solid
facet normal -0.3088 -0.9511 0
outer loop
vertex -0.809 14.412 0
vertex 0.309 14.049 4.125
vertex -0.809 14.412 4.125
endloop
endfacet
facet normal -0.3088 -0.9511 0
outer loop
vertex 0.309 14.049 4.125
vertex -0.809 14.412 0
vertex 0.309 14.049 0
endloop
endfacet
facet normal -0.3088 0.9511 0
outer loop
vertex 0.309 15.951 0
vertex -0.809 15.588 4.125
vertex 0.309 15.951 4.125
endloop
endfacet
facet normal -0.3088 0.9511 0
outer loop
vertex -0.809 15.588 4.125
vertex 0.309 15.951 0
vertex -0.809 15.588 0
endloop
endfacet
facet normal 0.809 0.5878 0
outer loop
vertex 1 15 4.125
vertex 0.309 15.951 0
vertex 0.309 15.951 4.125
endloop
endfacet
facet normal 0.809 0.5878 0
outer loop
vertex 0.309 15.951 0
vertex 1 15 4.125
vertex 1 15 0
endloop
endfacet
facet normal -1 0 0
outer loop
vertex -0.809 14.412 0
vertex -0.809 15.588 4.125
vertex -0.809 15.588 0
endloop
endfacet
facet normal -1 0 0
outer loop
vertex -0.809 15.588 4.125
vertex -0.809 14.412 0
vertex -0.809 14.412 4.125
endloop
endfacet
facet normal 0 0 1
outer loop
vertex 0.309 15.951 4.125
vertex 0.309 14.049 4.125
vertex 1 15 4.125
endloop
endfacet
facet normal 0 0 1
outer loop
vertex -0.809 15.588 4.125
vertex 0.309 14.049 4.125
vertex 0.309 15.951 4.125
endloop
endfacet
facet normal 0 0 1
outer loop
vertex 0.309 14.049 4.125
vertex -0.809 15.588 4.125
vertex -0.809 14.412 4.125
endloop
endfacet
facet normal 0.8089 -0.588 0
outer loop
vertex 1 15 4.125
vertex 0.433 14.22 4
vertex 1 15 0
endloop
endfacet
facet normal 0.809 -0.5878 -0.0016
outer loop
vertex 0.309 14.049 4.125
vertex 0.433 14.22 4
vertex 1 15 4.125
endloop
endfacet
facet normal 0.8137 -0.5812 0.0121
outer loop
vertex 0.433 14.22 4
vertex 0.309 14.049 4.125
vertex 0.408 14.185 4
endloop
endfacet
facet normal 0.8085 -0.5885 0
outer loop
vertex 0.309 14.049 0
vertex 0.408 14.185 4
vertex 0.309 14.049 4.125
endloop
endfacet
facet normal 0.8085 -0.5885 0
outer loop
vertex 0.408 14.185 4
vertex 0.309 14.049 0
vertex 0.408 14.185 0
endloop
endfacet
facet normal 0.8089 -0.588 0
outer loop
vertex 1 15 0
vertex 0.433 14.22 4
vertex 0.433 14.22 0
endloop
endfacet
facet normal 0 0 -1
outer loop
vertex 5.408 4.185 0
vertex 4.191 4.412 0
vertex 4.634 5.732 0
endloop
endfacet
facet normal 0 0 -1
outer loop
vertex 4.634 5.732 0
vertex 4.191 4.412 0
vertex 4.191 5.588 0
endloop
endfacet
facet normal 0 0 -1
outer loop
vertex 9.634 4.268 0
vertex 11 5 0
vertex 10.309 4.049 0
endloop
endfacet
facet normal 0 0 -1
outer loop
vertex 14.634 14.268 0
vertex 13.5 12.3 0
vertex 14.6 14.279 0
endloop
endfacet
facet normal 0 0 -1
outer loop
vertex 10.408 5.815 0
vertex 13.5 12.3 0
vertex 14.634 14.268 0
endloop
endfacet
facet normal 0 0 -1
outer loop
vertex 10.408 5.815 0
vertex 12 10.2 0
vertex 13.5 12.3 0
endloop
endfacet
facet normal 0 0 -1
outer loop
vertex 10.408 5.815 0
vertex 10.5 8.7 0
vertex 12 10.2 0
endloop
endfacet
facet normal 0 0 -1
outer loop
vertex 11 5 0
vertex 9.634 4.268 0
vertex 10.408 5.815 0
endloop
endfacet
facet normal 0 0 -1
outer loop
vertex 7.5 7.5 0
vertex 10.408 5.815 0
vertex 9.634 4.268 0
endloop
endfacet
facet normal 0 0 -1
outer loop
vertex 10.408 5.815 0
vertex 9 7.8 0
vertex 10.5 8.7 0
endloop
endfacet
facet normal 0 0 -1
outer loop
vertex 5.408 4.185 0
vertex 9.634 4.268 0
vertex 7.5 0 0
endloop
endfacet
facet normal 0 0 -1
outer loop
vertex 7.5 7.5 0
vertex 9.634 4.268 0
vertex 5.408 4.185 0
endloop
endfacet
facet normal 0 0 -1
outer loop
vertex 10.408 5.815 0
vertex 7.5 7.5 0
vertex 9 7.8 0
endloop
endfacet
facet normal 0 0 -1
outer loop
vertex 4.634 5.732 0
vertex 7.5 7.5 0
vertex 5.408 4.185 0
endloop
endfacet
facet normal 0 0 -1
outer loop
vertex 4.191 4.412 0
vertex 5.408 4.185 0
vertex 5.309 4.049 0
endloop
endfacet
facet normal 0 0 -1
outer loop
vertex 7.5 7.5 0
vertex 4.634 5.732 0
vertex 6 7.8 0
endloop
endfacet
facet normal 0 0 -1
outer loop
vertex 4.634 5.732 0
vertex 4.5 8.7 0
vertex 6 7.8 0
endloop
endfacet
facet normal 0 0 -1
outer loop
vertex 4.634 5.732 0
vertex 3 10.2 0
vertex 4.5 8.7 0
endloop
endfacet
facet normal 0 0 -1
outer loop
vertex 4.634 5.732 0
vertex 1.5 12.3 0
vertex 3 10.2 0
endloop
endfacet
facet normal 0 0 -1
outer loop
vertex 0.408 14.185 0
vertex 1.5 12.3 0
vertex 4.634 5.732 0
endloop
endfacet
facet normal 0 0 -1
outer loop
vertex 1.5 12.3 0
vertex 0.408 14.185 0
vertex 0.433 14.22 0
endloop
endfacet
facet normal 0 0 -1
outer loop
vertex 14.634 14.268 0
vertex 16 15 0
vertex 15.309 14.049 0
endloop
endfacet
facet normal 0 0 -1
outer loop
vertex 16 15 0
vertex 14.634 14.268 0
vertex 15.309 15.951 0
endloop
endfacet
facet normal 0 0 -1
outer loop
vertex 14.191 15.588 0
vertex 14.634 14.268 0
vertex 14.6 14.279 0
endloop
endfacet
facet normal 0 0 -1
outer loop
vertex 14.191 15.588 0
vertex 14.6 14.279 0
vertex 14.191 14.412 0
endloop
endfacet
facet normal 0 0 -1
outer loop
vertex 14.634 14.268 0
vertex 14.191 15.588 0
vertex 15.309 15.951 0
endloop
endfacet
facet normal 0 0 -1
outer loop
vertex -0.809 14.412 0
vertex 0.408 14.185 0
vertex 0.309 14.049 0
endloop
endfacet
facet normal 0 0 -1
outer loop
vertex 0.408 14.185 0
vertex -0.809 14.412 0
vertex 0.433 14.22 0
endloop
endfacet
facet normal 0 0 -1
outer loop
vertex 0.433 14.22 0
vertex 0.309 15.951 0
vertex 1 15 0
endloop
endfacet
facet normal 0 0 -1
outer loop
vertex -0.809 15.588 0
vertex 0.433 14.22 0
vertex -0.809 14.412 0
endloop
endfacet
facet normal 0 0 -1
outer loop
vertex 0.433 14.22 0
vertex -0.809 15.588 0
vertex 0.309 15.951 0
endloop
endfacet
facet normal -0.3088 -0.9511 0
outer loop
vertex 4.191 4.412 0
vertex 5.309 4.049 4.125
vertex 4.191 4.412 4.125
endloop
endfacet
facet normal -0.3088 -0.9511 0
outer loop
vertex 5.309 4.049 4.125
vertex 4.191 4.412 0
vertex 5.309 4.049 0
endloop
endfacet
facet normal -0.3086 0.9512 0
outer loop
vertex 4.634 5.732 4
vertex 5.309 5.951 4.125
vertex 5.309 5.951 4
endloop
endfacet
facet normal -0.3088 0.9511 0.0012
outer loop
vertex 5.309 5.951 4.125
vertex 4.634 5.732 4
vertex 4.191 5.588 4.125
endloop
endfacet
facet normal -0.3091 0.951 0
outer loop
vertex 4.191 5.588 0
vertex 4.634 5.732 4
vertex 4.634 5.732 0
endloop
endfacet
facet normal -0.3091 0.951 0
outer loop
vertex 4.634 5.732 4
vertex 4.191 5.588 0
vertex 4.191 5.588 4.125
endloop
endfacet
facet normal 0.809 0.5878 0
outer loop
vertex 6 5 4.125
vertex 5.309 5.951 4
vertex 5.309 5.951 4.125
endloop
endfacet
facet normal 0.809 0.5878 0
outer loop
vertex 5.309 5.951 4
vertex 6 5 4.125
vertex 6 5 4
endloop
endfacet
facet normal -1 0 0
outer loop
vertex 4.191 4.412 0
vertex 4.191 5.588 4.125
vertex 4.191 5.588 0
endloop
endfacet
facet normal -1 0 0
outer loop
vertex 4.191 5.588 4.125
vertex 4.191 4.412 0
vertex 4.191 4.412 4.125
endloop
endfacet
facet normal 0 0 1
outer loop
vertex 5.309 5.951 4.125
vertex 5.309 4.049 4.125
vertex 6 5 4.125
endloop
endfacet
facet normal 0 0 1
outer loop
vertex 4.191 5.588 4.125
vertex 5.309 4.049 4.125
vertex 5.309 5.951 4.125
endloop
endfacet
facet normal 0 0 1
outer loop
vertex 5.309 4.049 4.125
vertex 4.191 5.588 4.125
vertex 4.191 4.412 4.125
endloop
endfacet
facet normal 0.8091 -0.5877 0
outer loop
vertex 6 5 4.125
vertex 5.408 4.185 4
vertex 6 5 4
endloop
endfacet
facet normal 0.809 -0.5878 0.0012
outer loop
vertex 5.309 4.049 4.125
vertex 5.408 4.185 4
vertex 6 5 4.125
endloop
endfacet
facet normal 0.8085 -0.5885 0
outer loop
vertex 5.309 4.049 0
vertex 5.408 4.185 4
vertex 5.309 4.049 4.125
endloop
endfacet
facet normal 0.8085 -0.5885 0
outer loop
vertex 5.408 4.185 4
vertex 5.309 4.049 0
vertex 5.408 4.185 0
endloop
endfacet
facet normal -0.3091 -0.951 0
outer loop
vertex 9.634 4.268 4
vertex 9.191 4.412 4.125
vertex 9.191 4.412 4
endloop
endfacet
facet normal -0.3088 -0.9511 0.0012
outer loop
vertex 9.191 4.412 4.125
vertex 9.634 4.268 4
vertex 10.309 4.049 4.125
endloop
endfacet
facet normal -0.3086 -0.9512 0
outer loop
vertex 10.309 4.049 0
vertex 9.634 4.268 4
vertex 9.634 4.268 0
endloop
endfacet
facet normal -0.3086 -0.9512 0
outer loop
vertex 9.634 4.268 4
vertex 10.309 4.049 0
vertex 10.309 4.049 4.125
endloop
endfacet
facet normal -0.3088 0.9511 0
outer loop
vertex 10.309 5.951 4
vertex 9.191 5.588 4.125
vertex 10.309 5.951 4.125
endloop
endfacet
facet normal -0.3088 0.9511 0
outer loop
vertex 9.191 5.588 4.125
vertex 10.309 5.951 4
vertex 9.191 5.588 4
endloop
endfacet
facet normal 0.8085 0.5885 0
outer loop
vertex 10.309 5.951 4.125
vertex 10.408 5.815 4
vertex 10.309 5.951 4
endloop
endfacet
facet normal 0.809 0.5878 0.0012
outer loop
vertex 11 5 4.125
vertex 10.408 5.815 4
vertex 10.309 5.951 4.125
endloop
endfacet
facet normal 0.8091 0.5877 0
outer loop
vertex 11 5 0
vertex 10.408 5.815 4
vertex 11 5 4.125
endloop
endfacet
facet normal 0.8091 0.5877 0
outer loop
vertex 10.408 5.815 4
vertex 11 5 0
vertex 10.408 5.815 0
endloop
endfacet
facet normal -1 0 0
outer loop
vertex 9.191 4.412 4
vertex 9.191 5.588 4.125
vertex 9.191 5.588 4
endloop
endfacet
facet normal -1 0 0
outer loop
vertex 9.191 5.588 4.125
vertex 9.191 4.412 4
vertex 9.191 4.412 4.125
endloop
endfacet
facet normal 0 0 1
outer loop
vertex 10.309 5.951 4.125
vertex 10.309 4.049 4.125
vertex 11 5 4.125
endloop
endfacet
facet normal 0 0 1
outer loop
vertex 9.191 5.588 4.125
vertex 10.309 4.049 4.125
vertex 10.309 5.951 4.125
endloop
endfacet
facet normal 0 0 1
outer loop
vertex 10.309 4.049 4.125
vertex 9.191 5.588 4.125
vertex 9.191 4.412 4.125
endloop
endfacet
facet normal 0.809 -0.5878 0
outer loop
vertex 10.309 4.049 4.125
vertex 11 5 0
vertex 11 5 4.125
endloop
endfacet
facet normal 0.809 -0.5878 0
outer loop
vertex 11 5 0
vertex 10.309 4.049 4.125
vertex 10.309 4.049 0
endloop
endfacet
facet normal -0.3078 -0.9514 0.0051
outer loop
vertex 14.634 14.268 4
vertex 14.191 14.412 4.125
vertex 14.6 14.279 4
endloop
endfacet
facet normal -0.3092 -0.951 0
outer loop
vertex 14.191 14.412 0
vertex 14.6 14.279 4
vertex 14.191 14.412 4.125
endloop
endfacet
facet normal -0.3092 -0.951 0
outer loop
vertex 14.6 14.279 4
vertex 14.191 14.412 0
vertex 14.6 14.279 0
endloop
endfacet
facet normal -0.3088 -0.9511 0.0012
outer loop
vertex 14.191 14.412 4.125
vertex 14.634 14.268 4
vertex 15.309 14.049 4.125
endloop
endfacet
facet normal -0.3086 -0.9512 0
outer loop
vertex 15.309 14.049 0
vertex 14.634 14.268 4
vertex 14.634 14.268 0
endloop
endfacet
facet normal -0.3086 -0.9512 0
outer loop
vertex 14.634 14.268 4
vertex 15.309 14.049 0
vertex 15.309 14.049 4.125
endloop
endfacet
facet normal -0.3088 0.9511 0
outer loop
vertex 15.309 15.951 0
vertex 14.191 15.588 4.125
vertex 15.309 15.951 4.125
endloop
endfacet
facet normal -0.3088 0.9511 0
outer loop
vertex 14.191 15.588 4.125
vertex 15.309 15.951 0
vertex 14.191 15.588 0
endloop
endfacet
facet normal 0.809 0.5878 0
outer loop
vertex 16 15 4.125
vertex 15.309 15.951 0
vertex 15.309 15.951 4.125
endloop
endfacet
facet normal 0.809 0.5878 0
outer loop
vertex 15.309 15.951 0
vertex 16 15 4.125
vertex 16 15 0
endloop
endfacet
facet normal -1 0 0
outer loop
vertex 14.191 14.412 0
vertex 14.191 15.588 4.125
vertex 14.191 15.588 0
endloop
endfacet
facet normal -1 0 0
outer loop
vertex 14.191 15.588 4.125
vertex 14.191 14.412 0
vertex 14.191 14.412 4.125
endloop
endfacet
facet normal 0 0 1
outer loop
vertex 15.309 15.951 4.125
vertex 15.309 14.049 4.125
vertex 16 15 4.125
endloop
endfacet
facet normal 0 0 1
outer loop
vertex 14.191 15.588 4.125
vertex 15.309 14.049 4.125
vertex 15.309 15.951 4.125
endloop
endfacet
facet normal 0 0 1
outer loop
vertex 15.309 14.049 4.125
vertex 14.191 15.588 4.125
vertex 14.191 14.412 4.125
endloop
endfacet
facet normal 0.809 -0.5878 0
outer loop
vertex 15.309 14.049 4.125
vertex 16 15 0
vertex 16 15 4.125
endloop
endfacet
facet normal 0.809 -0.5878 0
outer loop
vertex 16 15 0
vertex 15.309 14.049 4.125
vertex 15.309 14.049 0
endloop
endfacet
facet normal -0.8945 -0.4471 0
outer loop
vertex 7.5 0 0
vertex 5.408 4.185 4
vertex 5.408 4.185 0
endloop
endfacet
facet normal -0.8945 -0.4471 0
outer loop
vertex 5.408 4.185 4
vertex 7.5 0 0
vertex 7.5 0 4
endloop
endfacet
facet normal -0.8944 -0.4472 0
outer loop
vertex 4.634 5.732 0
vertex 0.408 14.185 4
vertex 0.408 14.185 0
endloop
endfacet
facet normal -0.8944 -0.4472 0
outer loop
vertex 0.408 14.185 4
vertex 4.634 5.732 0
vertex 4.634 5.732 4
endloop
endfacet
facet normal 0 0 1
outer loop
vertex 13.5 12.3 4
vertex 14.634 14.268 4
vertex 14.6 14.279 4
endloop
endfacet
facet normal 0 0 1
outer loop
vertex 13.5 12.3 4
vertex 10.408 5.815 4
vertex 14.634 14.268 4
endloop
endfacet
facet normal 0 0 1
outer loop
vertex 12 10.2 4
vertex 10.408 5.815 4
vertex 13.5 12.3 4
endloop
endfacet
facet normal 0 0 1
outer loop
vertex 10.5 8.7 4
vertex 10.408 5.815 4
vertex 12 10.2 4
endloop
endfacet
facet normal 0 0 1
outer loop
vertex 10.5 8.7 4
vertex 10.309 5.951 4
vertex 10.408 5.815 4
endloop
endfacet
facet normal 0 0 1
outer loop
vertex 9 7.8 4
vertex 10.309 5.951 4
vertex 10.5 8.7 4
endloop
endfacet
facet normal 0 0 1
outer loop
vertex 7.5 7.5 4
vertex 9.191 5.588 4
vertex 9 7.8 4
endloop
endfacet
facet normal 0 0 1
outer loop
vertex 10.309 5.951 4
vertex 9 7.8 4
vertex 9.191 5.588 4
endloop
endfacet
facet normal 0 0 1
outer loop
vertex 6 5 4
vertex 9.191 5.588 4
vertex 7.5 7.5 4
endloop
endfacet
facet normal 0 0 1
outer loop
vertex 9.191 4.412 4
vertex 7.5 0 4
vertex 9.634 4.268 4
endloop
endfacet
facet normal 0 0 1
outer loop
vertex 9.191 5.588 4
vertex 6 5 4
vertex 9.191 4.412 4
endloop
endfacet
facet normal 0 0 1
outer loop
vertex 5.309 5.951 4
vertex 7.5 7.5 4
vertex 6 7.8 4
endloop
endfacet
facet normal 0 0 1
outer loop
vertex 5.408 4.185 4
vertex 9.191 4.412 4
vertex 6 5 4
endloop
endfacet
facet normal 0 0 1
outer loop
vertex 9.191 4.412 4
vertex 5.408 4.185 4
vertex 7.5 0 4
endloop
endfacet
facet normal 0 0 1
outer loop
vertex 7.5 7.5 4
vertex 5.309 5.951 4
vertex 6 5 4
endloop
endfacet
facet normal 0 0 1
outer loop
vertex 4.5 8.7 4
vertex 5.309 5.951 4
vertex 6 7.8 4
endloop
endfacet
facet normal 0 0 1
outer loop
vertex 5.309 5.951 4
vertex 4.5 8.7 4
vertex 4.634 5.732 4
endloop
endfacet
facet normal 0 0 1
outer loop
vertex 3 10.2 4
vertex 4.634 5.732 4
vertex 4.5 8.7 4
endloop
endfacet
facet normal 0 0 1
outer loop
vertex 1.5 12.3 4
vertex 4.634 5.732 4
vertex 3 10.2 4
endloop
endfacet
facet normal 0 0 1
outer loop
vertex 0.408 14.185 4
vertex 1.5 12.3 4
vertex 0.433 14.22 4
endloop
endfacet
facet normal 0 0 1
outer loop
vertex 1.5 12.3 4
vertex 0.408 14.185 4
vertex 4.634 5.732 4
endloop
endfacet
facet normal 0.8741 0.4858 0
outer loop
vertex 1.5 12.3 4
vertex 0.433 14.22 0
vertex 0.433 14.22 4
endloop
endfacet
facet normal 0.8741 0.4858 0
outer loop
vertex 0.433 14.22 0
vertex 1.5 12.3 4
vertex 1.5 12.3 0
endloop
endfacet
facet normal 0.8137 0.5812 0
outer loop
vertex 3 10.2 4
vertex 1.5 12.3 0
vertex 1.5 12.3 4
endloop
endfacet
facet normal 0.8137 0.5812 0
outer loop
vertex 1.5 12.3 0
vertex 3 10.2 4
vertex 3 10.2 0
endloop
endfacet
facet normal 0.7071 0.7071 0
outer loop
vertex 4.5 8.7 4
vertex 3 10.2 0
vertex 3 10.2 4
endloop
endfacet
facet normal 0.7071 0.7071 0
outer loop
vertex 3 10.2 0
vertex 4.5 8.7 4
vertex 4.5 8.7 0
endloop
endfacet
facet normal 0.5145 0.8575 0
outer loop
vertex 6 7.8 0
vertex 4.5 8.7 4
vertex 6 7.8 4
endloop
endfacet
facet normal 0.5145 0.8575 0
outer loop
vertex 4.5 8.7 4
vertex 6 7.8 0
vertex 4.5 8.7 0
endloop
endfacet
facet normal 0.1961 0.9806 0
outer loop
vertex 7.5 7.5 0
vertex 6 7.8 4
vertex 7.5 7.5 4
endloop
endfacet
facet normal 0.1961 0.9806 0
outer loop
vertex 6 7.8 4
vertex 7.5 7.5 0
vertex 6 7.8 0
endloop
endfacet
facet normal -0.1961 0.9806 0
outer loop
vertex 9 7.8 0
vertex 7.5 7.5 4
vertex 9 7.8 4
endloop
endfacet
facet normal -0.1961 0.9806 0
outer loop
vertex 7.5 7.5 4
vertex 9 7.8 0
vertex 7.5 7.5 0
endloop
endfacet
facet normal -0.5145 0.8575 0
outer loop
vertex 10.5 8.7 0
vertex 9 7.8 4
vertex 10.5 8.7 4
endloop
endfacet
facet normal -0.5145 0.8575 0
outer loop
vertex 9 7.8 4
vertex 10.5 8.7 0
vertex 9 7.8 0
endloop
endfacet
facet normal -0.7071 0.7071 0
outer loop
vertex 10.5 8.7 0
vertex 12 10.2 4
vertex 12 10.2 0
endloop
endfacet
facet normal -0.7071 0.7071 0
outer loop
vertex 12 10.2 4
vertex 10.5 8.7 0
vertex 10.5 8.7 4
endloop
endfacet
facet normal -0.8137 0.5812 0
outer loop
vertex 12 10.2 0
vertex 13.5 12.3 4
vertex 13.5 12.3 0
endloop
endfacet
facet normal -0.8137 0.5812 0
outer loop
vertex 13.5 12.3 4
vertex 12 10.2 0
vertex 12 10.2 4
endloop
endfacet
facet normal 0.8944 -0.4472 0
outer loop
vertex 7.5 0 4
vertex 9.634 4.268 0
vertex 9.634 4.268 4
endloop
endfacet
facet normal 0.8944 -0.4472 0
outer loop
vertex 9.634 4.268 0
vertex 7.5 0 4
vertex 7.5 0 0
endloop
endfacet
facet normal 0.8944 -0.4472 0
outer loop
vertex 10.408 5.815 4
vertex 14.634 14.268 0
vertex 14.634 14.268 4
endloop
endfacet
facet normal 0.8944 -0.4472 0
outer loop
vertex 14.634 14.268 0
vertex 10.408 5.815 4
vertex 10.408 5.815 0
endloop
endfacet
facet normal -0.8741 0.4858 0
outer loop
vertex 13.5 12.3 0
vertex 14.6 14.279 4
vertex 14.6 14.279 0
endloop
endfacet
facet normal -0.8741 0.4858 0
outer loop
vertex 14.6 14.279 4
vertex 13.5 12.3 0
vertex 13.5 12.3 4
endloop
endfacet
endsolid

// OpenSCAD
// https://www.thingiverse.com/thing:8443
//
joinfactor = 0.125;

gFocalPoint = [0,0];
gSteps = 10;
gHeight = 4;

BezQuadCurve( [[0, 15],[5,5],[10,5],[15,15]], [7.5,0], gSteps, gHeight);

//=======================================
// Functions
//=======================================
function BEZ03(u) = pow((1-u), 3);
function BEZ13(u) = 3*u*(pow((1-u),2));
function BEZ23(u) = 3*(pow(u,2))*(1-u);
function BEZ33(u) = pow(u,3);

function PointAlongBez4(p0, p1, p2, p3, u) = [
	BEZ03(u)*p0[0]+BEZ13(u)*p1[0]+BEZ23(u)*p2[0]+BEZ33(u)*p3[0],
	BEZ03(u)*p0[1]+BEZ13(u)*p1[1]+BEZ23(u)*p2[1]+BEZ33(u)*p3[1]];

//=======================================
// Modules
//=======================================
// c - ControlPoints
module BezQuadCurve(c, focalPoint, steps=gSteps, height=gHeight, showPoints=true)
{
	// Draw control points
	// Just comment this out when you're doing the real thing
	if (showPoints)
	{
		for(point=[0:3])
		{
			translate(c[point])
			color([1,0,0])
			cylinder(r=1, h=height+joinfactor);
		}
	}

	difference()
	for(step = [1:steps])
	{
		linear_extrude(height = height, convexity = 10) 
		polygon(
			points=[
				focalPoint,
				PointAlongBez4(c[0], c[1], c[2],c[3], step/steps),
				PointAlongBez4(c[0], c[1], c[2],c[3], (step-1)/steps)],
			paths=[[0,1,2,0]]
		);
	}
}

//==============================================
// Test functions
//==============================================
//PlotBEZ0(100);
//PlotBEZ1(100);
//PlotBEZ2(100);
//PlotBEZ3(100);
//PlotBez4Blending();


module PlotBEZ0(steps)
{
	cubeSize = 1;
	cubeHeight = steps;

	for (step=[0:steps])
	{
		translate([cubeSize*step, 0, 0])
		cube(size=[cubeSize, cubeSize, BEZ03(step/steps)*cubeHeight]);
	}	
}

module PlotBEZ1(steps)
{
	cubeSize = 1;
	cubeHeight = steps;

	for (step=[0:steps])
	{
		translate([cubeSize*step, 0, 0])
		cube(size=[cubeSize, cubeSize, BEZ13(step/steps)*cubeHeight]);
	}	
}

module PlotBEZ2(steps)
{
	cubeSize = 1;
	cubeHeight = steps;

	for (step=[0:steps])
	{
		translate([cubeSize*step, 0, 0])
		cube(size=[cubeSize, cubeSize, BEZ23(step/steps)*cubeHeight]);
	}	
}

module PlotBEZ3(steps)
{
	cubeSize = 1;
	cubeHeight = steps;

	for (step=[0:steps])
	{
		translate([cubeSize*step, 0, 0])
		cube(size=[cubeSize, cubeSize, BEZ33(step/steps)*cubeHeight]);
	}	
}

module PlotBez4Blending()
{
	sizing = 100;

	translate([0, 0, sizing + 10])
	PlotBEZ0(100);

	translate([sizing+10, 0, sizing + 10])
	PlotBEZ1(100);

	translate([0, 0, 0])
	PlotBEZ2(100);

	translate([sizing+10, 0, 0])
	PlotBEZ3(100);
}
